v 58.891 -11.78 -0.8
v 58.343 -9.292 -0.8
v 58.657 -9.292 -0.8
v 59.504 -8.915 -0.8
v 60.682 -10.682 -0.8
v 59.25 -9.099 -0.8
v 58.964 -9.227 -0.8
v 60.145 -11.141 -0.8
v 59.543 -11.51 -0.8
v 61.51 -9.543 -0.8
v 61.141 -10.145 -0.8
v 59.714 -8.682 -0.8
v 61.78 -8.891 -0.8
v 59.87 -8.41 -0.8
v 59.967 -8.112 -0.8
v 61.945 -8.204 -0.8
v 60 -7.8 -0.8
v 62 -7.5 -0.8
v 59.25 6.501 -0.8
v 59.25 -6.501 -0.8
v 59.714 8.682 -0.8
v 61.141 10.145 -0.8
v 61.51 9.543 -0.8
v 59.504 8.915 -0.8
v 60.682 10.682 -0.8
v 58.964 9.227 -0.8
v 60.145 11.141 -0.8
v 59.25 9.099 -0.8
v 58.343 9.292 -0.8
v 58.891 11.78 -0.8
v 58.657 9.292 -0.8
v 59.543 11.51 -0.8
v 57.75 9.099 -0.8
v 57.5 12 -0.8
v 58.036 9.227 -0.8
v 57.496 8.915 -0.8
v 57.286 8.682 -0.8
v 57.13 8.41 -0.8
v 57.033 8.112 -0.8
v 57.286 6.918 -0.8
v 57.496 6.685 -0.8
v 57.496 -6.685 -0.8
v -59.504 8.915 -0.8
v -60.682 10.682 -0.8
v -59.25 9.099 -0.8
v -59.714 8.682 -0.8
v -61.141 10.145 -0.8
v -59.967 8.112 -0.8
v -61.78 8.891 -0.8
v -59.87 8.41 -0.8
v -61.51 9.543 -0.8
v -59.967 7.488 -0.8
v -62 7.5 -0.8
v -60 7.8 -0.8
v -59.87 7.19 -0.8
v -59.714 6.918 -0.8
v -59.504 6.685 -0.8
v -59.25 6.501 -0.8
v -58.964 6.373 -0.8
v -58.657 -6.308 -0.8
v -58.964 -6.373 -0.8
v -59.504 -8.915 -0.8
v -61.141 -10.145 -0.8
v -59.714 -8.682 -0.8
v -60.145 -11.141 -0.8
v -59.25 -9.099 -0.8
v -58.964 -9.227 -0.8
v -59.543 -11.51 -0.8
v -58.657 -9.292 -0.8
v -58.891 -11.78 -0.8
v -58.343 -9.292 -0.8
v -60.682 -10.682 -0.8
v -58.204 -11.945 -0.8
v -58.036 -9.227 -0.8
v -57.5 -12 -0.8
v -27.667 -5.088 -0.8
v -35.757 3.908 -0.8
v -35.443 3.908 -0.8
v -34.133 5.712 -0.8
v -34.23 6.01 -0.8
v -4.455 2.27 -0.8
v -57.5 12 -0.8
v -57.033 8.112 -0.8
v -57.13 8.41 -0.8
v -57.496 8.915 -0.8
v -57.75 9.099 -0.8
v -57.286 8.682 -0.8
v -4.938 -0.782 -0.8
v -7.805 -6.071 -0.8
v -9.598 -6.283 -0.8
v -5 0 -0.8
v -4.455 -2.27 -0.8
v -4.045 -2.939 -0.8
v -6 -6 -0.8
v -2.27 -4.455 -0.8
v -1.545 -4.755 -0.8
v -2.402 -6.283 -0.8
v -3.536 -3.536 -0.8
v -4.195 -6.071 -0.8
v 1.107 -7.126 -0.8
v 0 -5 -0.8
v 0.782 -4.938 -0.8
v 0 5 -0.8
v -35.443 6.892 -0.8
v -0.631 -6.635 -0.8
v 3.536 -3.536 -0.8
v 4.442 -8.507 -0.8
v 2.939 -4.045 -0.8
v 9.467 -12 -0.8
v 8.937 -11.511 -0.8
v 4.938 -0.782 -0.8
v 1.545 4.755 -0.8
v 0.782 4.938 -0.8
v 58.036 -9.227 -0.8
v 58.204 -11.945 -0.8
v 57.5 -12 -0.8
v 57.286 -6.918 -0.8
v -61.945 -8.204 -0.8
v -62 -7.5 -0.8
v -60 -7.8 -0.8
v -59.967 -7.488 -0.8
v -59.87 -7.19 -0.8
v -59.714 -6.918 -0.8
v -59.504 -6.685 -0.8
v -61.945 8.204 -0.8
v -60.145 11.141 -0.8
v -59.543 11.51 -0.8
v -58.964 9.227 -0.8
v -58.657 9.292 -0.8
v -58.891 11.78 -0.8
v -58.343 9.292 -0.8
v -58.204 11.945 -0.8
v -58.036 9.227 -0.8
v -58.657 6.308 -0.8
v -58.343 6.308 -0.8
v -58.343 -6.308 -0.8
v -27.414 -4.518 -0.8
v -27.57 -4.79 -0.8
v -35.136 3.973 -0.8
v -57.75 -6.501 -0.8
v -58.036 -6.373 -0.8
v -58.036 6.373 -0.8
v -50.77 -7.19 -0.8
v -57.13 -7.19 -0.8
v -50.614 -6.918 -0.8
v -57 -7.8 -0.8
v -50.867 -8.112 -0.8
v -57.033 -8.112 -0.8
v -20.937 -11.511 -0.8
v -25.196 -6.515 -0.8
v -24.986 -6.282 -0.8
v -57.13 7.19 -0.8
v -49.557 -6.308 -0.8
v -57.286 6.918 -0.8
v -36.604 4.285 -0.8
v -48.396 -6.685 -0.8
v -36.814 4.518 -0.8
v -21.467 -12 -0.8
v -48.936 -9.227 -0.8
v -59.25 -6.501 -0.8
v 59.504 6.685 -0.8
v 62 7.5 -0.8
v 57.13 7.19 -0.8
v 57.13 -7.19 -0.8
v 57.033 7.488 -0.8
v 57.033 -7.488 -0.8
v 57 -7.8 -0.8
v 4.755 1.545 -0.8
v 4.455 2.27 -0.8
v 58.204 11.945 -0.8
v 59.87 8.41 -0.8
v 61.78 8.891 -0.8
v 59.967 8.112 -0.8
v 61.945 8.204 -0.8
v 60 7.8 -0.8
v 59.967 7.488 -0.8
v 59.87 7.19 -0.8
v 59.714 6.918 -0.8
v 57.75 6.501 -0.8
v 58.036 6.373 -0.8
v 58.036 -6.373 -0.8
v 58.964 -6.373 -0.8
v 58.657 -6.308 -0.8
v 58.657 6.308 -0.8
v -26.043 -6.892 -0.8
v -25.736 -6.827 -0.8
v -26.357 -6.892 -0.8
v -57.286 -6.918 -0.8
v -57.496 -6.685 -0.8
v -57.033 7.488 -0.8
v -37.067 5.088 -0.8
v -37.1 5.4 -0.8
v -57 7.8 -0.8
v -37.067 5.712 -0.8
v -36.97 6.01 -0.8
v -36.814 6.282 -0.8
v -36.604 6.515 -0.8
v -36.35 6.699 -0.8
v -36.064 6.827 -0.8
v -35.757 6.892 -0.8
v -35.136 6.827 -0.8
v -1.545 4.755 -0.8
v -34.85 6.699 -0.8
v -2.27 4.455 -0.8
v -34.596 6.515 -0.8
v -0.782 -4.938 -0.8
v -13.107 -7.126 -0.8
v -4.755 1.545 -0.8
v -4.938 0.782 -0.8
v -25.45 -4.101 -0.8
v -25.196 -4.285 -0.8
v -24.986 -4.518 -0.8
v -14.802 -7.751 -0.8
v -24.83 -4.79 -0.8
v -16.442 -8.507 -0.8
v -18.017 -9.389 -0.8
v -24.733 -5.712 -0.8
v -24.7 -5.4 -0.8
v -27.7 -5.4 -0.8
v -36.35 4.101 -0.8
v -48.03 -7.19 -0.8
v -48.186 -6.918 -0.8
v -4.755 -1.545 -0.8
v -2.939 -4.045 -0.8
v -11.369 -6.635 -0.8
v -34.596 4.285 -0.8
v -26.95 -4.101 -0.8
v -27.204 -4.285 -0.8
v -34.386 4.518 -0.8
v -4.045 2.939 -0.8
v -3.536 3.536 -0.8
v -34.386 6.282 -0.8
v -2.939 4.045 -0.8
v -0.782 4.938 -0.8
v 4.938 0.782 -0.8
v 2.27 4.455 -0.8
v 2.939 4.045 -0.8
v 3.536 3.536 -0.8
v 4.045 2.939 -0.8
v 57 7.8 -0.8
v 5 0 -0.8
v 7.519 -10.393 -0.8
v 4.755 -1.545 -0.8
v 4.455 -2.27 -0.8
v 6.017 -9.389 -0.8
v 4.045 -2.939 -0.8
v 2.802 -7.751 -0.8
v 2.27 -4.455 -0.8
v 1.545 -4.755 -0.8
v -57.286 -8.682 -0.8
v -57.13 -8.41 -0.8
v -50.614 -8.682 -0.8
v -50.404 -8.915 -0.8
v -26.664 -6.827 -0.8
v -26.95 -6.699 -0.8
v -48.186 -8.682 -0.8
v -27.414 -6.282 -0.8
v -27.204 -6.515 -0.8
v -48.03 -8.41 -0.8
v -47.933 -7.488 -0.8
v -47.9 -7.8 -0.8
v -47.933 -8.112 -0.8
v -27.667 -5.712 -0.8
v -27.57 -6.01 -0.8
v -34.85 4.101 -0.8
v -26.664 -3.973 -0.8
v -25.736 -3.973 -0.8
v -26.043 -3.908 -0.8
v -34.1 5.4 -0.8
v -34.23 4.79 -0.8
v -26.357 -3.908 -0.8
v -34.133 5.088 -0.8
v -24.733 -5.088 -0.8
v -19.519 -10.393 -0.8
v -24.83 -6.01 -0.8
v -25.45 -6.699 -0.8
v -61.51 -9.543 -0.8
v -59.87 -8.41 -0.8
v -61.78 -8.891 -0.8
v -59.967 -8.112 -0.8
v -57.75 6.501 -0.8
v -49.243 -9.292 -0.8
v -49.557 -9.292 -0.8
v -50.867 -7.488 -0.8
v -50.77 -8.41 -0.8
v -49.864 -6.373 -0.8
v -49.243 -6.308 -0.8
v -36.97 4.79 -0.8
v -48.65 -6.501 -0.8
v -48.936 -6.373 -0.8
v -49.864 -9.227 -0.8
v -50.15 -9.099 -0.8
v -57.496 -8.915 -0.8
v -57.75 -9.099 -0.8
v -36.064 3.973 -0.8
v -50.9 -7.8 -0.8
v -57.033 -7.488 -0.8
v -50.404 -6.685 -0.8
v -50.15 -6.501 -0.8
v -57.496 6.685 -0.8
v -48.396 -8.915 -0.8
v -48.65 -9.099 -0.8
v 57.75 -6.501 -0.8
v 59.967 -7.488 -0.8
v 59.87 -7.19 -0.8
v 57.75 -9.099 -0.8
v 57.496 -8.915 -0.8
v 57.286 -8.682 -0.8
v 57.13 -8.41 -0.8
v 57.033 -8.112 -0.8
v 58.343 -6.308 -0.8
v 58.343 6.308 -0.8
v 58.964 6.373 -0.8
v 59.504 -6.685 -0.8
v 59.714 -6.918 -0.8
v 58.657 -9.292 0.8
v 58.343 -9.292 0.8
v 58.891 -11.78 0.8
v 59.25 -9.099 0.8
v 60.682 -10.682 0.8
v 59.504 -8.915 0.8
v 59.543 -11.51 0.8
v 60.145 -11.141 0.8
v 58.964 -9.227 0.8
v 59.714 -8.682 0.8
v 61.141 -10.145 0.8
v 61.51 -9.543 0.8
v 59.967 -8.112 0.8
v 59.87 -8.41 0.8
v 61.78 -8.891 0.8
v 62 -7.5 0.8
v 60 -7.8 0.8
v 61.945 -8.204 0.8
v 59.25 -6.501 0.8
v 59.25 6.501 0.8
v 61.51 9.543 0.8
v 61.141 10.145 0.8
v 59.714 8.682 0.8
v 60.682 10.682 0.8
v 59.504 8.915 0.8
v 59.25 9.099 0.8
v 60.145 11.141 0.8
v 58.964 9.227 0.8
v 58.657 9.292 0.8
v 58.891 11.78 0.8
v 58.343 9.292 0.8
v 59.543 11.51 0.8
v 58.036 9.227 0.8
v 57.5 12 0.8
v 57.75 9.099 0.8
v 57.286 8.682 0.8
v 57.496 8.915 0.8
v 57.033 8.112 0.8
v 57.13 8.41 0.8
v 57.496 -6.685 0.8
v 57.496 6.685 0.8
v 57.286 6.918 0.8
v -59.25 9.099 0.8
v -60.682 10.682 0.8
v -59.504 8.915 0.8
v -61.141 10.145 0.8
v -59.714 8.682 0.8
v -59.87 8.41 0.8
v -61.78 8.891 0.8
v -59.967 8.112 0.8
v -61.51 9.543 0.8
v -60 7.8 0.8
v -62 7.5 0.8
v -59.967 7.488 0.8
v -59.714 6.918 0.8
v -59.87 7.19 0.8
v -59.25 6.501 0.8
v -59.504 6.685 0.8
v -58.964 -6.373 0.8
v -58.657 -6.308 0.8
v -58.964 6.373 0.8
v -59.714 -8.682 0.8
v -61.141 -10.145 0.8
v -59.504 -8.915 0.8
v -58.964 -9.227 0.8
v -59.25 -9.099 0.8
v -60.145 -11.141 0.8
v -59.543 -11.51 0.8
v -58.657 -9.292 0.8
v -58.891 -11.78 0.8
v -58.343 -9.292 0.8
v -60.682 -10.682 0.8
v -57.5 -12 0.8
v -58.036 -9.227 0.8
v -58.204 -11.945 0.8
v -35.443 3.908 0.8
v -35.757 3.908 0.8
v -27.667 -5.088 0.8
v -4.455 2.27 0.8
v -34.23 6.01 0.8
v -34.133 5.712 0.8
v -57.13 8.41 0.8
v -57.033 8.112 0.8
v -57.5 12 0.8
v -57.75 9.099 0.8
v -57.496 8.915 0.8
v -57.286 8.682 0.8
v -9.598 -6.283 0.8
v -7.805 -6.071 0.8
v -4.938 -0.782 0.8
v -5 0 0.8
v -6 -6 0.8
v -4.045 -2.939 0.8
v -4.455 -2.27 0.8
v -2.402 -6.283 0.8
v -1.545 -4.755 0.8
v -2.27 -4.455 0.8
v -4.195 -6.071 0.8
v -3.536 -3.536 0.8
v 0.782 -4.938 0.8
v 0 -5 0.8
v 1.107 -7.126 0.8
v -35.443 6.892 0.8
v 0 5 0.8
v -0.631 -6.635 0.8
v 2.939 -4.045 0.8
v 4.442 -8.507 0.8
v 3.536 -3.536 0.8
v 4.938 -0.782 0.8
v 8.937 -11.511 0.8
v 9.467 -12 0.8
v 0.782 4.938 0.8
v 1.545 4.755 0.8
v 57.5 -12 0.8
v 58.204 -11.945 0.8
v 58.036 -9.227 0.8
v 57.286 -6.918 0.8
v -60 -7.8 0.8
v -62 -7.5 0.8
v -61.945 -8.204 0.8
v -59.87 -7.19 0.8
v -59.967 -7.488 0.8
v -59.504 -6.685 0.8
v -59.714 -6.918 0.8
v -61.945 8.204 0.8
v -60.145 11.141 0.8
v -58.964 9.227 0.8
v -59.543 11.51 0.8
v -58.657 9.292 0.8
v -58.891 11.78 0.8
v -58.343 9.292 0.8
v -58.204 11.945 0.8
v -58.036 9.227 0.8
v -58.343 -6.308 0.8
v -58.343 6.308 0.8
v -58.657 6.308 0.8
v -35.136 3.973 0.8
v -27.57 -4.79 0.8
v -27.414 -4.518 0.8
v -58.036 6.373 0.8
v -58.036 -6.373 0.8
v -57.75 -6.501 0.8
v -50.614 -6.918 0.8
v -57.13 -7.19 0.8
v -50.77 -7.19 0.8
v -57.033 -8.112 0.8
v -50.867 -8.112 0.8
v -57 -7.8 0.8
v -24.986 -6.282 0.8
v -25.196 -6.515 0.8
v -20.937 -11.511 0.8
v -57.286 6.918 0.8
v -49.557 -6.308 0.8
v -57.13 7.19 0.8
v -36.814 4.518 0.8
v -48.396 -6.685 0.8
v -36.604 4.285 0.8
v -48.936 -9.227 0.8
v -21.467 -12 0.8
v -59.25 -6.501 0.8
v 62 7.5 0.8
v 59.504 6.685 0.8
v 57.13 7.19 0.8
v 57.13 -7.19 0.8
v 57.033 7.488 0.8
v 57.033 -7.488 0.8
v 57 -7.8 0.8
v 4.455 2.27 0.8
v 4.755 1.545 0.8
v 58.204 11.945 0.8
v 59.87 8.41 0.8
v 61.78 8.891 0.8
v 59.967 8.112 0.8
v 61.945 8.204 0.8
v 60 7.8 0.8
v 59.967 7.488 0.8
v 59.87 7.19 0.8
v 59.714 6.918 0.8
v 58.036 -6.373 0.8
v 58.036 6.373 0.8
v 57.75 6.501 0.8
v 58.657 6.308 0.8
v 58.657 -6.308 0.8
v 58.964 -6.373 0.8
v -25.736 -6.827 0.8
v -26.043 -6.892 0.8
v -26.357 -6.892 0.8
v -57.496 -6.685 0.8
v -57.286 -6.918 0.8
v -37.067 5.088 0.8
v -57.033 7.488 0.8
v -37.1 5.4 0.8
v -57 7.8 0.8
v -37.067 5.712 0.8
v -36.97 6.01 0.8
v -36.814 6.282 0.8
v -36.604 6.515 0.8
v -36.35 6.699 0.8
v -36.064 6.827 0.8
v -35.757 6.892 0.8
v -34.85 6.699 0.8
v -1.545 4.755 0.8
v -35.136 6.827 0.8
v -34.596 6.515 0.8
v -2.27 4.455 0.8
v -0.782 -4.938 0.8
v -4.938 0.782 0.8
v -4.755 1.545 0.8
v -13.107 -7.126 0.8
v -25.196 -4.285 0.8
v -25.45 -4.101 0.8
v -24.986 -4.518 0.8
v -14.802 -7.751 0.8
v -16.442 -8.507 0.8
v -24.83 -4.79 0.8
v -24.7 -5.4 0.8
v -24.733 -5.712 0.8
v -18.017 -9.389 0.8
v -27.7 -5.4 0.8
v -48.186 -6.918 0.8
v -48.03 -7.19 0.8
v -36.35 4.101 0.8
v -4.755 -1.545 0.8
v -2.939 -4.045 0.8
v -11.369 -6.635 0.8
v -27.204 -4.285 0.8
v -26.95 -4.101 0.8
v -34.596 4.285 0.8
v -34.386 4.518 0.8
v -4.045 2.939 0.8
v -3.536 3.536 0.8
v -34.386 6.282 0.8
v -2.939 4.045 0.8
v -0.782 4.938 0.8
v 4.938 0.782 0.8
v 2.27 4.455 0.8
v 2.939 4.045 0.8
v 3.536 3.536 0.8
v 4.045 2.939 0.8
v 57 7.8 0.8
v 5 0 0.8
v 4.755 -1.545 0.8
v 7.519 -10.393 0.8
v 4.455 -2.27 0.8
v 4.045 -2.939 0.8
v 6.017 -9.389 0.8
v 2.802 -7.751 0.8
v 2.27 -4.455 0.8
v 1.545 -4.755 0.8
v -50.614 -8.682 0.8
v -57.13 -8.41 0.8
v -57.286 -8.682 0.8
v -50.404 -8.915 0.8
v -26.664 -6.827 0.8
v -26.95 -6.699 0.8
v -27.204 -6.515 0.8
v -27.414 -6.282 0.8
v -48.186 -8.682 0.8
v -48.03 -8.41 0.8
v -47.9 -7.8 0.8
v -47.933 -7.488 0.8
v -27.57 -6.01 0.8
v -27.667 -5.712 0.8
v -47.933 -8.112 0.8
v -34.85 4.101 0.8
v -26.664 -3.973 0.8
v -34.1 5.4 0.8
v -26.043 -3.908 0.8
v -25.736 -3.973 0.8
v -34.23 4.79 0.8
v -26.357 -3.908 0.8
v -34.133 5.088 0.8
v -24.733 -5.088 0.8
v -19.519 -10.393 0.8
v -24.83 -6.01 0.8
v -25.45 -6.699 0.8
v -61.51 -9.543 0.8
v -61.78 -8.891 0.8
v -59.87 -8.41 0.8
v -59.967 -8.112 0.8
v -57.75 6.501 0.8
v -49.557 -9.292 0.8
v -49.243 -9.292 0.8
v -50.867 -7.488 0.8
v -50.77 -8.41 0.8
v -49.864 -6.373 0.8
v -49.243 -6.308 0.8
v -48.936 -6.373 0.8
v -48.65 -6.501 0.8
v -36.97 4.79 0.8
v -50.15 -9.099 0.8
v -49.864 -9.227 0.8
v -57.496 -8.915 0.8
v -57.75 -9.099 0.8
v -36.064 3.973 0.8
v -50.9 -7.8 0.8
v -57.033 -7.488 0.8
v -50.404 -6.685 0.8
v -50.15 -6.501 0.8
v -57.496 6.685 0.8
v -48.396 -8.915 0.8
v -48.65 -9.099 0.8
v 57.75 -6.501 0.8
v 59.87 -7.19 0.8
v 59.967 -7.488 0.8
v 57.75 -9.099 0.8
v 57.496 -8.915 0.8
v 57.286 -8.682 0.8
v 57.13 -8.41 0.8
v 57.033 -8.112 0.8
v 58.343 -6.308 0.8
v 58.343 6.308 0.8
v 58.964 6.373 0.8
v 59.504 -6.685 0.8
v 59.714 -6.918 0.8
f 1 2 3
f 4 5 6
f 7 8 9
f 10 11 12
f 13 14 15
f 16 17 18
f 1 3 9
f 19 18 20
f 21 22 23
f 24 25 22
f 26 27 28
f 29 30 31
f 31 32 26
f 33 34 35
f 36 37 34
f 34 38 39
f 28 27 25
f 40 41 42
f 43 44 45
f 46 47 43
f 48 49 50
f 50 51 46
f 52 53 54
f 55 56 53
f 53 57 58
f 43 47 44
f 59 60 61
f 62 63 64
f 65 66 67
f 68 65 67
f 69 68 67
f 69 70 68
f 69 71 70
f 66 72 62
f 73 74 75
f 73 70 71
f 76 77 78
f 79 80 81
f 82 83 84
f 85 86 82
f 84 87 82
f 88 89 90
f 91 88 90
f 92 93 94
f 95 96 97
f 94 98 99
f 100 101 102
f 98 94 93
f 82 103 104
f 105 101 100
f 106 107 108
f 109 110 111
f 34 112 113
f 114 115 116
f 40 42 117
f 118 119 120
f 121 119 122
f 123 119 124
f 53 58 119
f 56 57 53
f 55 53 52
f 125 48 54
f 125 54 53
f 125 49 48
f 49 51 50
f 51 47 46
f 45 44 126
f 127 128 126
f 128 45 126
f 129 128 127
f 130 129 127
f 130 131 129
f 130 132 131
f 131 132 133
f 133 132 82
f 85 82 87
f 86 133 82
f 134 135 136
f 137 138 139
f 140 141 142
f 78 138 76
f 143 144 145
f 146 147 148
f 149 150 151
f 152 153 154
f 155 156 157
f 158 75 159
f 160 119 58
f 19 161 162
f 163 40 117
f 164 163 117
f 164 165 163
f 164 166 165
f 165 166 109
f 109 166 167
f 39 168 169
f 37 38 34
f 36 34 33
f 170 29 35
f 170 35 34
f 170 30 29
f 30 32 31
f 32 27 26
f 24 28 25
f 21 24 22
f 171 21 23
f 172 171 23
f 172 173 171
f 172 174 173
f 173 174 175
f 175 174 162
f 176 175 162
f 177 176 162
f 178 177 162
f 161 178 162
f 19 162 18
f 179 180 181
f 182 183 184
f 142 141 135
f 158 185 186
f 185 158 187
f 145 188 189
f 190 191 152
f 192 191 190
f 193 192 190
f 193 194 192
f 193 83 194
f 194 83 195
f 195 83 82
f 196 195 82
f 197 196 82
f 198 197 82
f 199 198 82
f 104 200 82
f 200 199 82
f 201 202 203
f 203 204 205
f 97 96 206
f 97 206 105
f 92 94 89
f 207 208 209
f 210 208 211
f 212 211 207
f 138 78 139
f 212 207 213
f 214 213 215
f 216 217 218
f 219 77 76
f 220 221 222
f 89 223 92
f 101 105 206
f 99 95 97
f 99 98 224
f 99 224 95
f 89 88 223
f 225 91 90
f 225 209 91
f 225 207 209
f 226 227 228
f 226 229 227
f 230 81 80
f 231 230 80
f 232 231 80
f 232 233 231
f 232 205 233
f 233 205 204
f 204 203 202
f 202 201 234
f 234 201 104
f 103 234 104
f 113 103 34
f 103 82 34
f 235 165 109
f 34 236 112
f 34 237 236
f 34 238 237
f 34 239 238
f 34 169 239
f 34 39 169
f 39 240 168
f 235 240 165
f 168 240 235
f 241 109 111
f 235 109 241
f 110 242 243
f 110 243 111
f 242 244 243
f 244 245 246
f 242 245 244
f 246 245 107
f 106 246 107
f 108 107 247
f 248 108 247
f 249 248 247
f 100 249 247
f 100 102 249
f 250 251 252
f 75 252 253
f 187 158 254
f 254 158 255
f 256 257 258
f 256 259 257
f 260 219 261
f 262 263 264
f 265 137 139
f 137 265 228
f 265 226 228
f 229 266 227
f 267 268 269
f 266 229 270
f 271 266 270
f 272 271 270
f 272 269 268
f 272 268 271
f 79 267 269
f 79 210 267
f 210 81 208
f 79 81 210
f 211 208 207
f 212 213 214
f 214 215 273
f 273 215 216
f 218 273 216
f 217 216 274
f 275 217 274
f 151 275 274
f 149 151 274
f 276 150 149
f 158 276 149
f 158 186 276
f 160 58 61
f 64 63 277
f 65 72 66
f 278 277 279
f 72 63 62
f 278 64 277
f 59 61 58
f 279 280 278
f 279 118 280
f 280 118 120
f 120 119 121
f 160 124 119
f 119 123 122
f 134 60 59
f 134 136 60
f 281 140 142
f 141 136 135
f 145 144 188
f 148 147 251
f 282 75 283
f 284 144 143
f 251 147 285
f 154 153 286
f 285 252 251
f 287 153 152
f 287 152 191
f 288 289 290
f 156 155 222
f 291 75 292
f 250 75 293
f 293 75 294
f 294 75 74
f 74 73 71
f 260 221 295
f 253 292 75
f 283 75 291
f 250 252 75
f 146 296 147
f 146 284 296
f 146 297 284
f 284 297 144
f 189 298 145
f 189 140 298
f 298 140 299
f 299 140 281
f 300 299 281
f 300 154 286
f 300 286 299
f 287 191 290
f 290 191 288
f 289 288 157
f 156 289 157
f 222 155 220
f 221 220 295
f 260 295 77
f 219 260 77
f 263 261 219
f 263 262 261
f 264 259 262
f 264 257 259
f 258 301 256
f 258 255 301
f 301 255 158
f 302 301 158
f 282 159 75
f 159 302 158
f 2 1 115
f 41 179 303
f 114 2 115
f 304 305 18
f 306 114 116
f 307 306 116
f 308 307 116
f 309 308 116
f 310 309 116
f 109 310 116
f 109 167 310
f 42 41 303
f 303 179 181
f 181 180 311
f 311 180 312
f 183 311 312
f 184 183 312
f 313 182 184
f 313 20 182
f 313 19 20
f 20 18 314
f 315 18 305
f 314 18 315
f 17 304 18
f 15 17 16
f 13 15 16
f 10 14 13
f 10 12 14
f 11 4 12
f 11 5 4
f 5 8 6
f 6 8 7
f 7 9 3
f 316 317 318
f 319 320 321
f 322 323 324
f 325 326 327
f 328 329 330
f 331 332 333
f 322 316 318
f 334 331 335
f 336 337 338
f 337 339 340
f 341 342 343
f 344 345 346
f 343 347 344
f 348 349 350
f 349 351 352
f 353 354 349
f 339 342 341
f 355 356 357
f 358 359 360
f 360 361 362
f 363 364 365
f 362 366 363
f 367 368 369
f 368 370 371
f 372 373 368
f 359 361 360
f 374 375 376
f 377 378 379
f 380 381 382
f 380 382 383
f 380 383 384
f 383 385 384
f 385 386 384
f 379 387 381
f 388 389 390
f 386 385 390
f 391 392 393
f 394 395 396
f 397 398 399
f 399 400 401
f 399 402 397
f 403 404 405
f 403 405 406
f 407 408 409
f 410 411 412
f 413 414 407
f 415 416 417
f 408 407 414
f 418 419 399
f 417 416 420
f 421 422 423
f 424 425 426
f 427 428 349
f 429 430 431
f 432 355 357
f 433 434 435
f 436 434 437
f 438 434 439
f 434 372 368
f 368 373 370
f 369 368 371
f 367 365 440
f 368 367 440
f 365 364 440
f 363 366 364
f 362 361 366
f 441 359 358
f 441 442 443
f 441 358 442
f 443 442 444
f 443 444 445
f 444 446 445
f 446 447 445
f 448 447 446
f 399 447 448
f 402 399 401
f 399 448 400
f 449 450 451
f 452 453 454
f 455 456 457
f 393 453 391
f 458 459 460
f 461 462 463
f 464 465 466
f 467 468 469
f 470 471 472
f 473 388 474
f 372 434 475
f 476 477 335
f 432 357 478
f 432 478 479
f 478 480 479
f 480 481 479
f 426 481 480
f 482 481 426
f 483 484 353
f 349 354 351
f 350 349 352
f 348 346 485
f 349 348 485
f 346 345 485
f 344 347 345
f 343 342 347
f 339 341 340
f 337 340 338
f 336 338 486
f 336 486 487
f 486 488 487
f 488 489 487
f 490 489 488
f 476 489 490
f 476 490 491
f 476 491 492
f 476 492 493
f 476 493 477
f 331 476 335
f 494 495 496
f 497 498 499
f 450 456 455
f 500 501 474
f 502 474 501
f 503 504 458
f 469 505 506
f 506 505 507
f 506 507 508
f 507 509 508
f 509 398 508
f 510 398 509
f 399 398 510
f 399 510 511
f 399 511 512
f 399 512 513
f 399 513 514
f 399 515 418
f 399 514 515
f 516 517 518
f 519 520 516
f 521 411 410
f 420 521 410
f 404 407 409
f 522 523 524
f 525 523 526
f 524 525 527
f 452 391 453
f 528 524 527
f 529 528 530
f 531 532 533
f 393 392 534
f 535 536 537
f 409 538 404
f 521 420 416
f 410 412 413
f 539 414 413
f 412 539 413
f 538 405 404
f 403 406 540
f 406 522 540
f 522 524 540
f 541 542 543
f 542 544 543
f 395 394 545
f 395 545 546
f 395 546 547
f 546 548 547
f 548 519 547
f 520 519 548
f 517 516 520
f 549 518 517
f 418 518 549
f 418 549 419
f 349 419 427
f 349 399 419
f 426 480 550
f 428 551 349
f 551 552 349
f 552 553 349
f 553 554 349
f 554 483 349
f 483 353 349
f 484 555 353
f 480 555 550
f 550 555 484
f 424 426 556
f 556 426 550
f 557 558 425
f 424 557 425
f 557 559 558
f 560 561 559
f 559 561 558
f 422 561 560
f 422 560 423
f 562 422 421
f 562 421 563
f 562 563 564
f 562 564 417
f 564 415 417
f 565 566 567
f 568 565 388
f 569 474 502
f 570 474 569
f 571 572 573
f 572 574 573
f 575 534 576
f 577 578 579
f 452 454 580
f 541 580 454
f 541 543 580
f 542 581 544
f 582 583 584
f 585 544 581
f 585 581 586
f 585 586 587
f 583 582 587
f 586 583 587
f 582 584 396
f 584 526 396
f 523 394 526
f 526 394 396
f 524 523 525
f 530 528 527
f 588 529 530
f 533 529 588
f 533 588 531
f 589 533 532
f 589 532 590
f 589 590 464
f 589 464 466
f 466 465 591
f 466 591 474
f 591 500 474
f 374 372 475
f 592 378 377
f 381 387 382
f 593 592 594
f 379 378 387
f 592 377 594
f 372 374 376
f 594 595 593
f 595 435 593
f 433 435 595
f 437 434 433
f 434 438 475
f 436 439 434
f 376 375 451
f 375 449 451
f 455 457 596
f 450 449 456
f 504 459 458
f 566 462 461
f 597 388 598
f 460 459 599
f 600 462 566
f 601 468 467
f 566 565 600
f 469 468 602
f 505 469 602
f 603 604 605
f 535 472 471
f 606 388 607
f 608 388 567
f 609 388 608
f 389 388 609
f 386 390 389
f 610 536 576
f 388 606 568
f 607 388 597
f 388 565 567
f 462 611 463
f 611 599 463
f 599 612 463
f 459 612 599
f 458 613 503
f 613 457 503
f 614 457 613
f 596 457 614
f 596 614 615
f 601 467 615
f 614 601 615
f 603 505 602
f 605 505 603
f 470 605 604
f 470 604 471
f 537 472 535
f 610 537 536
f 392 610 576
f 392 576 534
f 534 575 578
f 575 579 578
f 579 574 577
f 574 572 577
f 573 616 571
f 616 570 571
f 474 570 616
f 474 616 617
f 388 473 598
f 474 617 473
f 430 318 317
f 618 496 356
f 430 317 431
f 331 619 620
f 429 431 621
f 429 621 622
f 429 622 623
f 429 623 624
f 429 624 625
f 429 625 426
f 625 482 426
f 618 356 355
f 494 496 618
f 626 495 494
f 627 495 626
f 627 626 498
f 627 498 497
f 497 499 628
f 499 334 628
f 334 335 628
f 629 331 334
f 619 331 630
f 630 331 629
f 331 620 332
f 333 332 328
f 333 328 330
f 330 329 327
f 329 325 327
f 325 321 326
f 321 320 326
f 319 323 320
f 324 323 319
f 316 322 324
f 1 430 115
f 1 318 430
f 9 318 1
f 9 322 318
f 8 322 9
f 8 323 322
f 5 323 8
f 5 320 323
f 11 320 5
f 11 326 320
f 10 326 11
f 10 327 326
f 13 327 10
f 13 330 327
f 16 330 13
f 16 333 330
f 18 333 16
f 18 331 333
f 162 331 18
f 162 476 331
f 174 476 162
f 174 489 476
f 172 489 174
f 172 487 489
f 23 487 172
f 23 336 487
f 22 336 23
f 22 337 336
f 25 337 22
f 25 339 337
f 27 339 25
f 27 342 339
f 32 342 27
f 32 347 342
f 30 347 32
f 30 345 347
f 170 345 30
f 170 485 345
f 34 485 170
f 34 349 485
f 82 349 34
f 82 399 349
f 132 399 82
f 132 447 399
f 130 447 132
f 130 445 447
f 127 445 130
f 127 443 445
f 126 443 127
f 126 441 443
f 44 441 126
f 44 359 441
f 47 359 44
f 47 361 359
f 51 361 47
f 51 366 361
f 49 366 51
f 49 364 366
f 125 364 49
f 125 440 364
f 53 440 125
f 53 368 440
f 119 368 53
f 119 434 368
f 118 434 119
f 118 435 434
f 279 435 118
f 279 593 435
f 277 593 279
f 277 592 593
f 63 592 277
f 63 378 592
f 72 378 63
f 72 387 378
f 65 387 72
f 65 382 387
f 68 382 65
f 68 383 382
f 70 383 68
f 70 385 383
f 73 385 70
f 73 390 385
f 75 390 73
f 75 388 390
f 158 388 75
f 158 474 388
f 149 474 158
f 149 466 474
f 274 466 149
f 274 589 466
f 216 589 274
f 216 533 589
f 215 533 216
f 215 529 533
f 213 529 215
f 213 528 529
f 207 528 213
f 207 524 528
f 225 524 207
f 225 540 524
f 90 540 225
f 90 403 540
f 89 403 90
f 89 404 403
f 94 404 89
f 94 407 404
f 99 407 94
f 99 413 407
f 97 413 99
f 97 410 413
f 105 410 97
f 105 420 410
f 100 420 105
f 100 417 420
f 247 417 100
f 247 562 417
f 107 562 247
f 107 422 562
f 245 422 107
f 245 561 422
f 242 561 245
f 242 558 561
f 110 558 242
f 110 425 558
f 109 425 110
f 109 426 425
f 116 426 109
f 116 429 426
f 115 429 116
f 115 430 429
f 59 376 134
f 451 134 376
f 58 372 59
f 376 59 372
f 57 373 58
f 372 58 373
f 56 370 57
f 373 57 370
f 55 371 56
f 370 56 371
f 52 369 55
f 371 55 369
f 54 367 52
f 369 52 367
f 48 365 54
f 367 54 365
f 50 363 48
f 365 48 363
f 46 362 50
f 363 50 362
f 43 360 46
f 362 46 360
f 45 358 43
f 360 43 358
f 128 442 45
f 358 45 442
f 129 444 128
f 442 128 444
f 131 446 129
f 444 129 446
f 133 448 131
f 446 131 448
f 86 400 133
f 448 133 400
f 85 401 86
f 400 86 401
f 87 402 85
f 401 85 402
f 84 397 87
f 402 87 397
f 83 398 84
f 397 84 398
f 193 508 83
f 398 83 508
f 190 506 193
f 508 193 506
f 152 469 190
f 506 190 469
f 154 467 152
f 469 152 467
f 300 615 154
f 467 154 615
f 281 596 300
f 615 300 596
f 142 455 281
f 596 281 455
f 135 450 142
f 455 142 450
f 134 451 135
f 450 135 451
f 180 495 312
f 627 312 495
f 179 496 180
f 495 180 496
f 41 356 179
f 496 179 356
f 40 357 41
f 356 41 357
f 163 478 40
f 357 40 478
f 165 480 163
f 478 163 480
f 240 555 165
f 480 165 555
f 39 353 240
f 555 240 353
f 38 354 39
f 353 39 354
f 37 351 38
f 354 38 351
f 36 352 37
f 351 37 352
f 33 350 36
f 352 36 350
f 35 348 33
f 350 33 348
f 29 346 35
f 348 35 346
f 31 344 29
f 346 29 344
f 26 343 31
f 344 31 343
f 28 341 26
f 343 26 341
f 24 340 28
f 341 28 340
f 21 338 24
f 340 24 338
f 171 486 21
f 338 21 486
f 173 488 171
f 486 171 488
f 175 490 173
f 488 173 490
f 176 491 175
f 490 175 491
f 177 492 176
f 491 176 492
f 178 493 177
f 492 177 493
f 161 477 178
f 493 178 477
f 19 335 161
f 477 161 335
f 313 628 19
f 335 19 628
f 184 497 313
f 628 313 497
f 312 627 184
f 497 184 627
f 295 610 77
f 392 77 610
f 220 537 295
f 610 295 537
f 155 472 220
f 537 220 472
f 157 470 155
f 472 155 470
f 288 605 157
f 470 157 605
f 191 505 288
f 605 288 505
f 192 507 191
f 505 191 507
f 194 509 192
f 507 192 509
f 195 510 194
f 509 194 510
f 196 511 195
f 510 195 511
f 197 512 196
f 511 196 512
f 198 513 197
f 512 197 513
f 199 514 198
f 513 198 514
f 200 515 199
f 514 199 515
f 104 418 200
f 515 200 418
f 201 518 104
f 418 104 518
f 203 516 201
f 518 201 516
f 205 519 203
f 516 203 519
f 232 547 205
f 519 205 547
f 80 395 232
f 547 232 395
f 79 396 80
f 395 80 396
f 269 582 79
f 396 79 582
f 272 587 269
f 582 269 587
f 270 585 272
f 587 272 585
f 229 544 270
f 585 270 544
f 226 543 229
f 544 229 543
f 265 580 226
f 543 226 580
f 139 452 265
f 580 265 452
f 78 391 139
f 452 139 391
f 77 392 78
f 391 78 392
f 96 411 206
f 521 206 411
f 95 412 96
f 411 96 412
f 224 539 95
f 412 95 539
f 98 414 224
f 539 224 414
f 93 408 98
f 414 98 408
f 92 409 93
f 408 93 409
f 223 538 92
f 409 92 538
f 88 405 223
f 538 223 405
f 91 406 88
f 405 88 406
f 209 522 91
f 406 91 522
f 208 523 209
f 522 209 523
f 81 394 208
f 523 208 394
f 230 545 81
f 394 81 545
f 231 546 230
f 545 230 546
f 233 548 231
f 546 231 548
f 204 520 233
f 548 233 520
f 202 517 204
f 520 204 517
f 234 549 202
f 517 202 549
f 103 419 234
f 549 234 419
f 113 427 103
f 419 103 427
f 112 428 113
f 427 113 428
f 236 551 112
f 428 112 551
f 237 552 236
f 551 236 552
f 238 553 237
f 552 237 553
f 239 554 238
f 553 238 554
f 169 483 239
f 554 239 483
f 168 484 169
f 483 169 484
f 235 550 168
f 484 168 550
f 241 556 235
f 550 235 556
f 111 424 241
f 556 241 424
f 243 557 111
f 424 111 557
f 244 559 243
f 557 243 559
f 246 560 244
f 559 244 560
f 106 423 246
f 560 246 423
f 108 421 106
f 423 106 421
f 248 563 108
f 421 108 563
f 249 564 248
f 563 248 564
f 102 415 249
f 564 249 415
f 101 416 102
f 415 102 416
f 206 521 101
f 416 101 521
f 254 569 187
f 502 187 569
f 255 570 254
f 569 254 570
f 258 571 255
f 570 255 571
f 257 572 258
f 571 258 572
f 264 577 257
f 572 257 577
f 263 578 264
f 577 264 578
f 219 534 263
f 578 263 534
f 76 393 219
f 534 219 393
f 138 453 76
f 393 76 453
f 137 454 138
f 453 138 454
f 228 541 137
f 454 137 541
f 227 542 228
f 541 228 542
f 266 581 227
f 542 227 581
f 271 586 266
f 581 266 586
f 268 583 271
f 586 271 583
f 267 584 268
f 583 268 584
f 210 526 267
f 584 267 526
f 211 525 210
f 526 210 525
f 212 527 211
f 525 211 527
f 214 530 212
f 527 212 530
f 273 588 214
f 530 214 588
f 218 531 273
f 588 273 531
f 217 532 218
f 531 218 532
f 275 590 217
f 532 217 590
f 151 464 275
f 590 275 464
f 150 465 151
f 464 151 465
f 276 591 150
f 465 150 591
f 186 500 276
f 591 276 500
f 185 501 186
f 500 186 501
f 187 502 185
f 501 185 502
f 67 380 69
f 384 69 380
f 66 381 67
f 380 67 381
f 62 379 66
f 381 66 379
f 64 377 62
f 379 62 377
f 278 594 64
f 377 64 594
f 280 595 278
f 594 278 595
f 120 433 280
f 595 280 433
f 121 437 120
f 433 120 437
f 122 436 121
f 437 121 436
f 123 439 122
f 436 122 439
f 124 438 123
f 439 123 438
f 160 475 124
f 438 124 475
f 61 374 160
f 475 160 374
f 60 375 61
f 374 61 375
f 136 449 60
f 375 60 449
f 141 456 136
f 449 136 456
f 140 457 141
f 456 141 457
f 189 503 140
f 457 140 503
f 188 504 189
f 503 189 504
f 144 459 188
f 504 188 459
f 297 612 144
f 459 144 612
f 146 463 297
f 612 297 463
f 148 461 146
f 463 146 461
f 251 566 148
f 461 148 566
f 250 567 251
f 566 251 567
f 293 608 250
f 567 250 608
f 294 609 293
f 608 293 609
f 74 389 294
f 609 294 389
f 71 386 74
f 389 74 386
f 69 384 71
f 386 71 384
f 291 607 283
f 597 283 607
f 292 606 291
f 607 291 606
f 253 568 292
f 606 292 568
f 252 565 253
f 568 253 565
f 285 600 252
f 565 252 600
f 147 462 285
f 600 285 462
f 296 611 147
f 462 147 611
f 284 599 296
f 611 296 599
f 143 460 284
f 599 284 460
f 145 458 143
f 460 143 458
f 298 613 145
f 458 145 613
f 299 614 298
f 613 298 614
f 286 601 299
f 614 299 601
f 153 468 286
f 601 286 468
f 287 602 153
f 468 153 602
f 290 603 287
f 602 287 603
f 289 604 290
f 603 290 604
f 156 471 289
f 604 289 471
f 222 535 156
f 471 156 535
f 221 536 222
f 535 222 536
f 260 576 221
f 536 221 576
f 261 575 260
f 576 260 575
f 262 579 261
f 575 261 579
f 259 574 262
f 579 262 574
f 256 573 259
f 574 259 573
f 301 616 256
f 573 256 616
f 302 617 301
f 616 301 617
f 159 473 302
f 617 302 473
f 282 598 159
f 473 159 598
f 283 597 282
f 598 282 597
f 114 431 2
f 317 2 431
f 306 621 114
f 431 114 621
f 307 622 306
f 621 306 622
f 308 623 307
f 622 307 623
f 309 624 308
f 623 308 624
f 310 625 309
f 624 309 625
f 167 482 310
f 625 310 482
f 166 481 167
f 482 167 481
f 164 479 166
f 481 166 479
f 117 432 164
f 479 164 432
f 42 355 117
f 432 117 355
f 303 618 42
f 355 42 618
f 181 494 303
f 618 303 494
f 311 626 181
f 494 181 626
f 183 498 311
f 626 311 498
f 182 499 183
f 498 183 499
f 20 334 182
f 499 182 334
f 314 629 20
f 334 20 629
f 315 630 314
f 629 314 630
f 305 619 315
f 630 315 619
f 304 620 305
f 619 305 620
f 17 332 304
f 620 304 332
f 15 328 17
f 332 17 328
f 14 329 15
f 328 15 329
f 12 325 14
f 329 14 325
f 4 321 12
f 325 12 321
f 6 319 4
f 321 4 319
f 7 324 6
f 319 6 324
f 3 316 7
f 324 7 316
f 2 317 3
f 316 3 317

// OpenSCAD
// part_id: b18
// name: B18 link plate
// source_drawing_ids: DRW-002
// units: mm
// revision: 0.1
// SPDX-License-Identifier: MIT

module b18_profile_2d(length = 124, height = 24, corner_r = 4.5,
                      center_cut_r = 23,
                      h_d = 3.0,
                      center_hole_d = 10.0) {
    center_hole_x = 62.0;
    center_hole_y = 12.0;
    center_cut_x = center_hole_x - 6.0;
    center_cut_y = center_hole_y - 29.0;
    edge_hole_x_left = 3.5;
    edge_hole_x_right = length - 3.5;
    edge_hole_y_offset = 7.8;
    mid_hole_dx_upper = 35.6;
    mid_hole_dx_lower = 26.2;
    mid_hole_dy = 5.4;
    left_inner_hole_dx = 49.4;
    left_inner_hole_dy = 7.8;

    difference() {
        // Rounded rectangle envelope.
        hull() {
            translate([corner_r, corner_r]) circle(r = corner_r, $fn = 40);
            translate([length - corner_r, corner_r]) circle(r = corner_r, $fn = 40);
            translate([corner_r, height - corner_r]) circle(r = corner_r, $fn = 40);
            translate([length - corner_r, height - corner_r]) circle(r = corner_r, $fn = 40);
        }

        // Central underside clearance arc.
        translate([center_cut_x, center_cut_y])
            circle(r = center_cut_r, $fn = 80);

        // Main center hole.
        translate([center_hole_x, center_hole_y])
            circle(d = center_hole_d, $fn = 40);

        // Hole pattern (sheet-10 approximation, intended for visual and assembly use).
        holes = [
            [edge_hole_x_left, center_hole_y - edge_hole_y_offset],
            [edge_hole_x_left, center_hole_y + edge_hole_y_offset],
            [center_hole_x - mid_hole_dx_upper, center_hole_y + mid_hole_dy],
            [center_hole_x - mid_hole_dx_lower, center_hole_y - mid_hole_dy],
            [center_hole_x - left_inner_hole_dx, center_hole_y - left_inner_hole_dy],
            [edge_hole_x_right, center_hole_y - edge_hole_y_offset],
            [edge_hole_x_right, center_hole_y + edge_hole_y_offset]
        ];

        for (p = holes)
            translate(p) circle(d = h_d, $fn = 30);
    }
}

module part_b18(length = 124, height = 24, thickness = 1.6) {
    translate([-length / 2, -height / 2, -thickness / 2])
        linear_extrude(height = thickness)
            b18_profile_2d(length = length, height = height);
}

// ---- "main guard" ----
// Default to previewing when opened directly:
if (is_undef(__LIB_MODE__)) {
    part_b18();
}
